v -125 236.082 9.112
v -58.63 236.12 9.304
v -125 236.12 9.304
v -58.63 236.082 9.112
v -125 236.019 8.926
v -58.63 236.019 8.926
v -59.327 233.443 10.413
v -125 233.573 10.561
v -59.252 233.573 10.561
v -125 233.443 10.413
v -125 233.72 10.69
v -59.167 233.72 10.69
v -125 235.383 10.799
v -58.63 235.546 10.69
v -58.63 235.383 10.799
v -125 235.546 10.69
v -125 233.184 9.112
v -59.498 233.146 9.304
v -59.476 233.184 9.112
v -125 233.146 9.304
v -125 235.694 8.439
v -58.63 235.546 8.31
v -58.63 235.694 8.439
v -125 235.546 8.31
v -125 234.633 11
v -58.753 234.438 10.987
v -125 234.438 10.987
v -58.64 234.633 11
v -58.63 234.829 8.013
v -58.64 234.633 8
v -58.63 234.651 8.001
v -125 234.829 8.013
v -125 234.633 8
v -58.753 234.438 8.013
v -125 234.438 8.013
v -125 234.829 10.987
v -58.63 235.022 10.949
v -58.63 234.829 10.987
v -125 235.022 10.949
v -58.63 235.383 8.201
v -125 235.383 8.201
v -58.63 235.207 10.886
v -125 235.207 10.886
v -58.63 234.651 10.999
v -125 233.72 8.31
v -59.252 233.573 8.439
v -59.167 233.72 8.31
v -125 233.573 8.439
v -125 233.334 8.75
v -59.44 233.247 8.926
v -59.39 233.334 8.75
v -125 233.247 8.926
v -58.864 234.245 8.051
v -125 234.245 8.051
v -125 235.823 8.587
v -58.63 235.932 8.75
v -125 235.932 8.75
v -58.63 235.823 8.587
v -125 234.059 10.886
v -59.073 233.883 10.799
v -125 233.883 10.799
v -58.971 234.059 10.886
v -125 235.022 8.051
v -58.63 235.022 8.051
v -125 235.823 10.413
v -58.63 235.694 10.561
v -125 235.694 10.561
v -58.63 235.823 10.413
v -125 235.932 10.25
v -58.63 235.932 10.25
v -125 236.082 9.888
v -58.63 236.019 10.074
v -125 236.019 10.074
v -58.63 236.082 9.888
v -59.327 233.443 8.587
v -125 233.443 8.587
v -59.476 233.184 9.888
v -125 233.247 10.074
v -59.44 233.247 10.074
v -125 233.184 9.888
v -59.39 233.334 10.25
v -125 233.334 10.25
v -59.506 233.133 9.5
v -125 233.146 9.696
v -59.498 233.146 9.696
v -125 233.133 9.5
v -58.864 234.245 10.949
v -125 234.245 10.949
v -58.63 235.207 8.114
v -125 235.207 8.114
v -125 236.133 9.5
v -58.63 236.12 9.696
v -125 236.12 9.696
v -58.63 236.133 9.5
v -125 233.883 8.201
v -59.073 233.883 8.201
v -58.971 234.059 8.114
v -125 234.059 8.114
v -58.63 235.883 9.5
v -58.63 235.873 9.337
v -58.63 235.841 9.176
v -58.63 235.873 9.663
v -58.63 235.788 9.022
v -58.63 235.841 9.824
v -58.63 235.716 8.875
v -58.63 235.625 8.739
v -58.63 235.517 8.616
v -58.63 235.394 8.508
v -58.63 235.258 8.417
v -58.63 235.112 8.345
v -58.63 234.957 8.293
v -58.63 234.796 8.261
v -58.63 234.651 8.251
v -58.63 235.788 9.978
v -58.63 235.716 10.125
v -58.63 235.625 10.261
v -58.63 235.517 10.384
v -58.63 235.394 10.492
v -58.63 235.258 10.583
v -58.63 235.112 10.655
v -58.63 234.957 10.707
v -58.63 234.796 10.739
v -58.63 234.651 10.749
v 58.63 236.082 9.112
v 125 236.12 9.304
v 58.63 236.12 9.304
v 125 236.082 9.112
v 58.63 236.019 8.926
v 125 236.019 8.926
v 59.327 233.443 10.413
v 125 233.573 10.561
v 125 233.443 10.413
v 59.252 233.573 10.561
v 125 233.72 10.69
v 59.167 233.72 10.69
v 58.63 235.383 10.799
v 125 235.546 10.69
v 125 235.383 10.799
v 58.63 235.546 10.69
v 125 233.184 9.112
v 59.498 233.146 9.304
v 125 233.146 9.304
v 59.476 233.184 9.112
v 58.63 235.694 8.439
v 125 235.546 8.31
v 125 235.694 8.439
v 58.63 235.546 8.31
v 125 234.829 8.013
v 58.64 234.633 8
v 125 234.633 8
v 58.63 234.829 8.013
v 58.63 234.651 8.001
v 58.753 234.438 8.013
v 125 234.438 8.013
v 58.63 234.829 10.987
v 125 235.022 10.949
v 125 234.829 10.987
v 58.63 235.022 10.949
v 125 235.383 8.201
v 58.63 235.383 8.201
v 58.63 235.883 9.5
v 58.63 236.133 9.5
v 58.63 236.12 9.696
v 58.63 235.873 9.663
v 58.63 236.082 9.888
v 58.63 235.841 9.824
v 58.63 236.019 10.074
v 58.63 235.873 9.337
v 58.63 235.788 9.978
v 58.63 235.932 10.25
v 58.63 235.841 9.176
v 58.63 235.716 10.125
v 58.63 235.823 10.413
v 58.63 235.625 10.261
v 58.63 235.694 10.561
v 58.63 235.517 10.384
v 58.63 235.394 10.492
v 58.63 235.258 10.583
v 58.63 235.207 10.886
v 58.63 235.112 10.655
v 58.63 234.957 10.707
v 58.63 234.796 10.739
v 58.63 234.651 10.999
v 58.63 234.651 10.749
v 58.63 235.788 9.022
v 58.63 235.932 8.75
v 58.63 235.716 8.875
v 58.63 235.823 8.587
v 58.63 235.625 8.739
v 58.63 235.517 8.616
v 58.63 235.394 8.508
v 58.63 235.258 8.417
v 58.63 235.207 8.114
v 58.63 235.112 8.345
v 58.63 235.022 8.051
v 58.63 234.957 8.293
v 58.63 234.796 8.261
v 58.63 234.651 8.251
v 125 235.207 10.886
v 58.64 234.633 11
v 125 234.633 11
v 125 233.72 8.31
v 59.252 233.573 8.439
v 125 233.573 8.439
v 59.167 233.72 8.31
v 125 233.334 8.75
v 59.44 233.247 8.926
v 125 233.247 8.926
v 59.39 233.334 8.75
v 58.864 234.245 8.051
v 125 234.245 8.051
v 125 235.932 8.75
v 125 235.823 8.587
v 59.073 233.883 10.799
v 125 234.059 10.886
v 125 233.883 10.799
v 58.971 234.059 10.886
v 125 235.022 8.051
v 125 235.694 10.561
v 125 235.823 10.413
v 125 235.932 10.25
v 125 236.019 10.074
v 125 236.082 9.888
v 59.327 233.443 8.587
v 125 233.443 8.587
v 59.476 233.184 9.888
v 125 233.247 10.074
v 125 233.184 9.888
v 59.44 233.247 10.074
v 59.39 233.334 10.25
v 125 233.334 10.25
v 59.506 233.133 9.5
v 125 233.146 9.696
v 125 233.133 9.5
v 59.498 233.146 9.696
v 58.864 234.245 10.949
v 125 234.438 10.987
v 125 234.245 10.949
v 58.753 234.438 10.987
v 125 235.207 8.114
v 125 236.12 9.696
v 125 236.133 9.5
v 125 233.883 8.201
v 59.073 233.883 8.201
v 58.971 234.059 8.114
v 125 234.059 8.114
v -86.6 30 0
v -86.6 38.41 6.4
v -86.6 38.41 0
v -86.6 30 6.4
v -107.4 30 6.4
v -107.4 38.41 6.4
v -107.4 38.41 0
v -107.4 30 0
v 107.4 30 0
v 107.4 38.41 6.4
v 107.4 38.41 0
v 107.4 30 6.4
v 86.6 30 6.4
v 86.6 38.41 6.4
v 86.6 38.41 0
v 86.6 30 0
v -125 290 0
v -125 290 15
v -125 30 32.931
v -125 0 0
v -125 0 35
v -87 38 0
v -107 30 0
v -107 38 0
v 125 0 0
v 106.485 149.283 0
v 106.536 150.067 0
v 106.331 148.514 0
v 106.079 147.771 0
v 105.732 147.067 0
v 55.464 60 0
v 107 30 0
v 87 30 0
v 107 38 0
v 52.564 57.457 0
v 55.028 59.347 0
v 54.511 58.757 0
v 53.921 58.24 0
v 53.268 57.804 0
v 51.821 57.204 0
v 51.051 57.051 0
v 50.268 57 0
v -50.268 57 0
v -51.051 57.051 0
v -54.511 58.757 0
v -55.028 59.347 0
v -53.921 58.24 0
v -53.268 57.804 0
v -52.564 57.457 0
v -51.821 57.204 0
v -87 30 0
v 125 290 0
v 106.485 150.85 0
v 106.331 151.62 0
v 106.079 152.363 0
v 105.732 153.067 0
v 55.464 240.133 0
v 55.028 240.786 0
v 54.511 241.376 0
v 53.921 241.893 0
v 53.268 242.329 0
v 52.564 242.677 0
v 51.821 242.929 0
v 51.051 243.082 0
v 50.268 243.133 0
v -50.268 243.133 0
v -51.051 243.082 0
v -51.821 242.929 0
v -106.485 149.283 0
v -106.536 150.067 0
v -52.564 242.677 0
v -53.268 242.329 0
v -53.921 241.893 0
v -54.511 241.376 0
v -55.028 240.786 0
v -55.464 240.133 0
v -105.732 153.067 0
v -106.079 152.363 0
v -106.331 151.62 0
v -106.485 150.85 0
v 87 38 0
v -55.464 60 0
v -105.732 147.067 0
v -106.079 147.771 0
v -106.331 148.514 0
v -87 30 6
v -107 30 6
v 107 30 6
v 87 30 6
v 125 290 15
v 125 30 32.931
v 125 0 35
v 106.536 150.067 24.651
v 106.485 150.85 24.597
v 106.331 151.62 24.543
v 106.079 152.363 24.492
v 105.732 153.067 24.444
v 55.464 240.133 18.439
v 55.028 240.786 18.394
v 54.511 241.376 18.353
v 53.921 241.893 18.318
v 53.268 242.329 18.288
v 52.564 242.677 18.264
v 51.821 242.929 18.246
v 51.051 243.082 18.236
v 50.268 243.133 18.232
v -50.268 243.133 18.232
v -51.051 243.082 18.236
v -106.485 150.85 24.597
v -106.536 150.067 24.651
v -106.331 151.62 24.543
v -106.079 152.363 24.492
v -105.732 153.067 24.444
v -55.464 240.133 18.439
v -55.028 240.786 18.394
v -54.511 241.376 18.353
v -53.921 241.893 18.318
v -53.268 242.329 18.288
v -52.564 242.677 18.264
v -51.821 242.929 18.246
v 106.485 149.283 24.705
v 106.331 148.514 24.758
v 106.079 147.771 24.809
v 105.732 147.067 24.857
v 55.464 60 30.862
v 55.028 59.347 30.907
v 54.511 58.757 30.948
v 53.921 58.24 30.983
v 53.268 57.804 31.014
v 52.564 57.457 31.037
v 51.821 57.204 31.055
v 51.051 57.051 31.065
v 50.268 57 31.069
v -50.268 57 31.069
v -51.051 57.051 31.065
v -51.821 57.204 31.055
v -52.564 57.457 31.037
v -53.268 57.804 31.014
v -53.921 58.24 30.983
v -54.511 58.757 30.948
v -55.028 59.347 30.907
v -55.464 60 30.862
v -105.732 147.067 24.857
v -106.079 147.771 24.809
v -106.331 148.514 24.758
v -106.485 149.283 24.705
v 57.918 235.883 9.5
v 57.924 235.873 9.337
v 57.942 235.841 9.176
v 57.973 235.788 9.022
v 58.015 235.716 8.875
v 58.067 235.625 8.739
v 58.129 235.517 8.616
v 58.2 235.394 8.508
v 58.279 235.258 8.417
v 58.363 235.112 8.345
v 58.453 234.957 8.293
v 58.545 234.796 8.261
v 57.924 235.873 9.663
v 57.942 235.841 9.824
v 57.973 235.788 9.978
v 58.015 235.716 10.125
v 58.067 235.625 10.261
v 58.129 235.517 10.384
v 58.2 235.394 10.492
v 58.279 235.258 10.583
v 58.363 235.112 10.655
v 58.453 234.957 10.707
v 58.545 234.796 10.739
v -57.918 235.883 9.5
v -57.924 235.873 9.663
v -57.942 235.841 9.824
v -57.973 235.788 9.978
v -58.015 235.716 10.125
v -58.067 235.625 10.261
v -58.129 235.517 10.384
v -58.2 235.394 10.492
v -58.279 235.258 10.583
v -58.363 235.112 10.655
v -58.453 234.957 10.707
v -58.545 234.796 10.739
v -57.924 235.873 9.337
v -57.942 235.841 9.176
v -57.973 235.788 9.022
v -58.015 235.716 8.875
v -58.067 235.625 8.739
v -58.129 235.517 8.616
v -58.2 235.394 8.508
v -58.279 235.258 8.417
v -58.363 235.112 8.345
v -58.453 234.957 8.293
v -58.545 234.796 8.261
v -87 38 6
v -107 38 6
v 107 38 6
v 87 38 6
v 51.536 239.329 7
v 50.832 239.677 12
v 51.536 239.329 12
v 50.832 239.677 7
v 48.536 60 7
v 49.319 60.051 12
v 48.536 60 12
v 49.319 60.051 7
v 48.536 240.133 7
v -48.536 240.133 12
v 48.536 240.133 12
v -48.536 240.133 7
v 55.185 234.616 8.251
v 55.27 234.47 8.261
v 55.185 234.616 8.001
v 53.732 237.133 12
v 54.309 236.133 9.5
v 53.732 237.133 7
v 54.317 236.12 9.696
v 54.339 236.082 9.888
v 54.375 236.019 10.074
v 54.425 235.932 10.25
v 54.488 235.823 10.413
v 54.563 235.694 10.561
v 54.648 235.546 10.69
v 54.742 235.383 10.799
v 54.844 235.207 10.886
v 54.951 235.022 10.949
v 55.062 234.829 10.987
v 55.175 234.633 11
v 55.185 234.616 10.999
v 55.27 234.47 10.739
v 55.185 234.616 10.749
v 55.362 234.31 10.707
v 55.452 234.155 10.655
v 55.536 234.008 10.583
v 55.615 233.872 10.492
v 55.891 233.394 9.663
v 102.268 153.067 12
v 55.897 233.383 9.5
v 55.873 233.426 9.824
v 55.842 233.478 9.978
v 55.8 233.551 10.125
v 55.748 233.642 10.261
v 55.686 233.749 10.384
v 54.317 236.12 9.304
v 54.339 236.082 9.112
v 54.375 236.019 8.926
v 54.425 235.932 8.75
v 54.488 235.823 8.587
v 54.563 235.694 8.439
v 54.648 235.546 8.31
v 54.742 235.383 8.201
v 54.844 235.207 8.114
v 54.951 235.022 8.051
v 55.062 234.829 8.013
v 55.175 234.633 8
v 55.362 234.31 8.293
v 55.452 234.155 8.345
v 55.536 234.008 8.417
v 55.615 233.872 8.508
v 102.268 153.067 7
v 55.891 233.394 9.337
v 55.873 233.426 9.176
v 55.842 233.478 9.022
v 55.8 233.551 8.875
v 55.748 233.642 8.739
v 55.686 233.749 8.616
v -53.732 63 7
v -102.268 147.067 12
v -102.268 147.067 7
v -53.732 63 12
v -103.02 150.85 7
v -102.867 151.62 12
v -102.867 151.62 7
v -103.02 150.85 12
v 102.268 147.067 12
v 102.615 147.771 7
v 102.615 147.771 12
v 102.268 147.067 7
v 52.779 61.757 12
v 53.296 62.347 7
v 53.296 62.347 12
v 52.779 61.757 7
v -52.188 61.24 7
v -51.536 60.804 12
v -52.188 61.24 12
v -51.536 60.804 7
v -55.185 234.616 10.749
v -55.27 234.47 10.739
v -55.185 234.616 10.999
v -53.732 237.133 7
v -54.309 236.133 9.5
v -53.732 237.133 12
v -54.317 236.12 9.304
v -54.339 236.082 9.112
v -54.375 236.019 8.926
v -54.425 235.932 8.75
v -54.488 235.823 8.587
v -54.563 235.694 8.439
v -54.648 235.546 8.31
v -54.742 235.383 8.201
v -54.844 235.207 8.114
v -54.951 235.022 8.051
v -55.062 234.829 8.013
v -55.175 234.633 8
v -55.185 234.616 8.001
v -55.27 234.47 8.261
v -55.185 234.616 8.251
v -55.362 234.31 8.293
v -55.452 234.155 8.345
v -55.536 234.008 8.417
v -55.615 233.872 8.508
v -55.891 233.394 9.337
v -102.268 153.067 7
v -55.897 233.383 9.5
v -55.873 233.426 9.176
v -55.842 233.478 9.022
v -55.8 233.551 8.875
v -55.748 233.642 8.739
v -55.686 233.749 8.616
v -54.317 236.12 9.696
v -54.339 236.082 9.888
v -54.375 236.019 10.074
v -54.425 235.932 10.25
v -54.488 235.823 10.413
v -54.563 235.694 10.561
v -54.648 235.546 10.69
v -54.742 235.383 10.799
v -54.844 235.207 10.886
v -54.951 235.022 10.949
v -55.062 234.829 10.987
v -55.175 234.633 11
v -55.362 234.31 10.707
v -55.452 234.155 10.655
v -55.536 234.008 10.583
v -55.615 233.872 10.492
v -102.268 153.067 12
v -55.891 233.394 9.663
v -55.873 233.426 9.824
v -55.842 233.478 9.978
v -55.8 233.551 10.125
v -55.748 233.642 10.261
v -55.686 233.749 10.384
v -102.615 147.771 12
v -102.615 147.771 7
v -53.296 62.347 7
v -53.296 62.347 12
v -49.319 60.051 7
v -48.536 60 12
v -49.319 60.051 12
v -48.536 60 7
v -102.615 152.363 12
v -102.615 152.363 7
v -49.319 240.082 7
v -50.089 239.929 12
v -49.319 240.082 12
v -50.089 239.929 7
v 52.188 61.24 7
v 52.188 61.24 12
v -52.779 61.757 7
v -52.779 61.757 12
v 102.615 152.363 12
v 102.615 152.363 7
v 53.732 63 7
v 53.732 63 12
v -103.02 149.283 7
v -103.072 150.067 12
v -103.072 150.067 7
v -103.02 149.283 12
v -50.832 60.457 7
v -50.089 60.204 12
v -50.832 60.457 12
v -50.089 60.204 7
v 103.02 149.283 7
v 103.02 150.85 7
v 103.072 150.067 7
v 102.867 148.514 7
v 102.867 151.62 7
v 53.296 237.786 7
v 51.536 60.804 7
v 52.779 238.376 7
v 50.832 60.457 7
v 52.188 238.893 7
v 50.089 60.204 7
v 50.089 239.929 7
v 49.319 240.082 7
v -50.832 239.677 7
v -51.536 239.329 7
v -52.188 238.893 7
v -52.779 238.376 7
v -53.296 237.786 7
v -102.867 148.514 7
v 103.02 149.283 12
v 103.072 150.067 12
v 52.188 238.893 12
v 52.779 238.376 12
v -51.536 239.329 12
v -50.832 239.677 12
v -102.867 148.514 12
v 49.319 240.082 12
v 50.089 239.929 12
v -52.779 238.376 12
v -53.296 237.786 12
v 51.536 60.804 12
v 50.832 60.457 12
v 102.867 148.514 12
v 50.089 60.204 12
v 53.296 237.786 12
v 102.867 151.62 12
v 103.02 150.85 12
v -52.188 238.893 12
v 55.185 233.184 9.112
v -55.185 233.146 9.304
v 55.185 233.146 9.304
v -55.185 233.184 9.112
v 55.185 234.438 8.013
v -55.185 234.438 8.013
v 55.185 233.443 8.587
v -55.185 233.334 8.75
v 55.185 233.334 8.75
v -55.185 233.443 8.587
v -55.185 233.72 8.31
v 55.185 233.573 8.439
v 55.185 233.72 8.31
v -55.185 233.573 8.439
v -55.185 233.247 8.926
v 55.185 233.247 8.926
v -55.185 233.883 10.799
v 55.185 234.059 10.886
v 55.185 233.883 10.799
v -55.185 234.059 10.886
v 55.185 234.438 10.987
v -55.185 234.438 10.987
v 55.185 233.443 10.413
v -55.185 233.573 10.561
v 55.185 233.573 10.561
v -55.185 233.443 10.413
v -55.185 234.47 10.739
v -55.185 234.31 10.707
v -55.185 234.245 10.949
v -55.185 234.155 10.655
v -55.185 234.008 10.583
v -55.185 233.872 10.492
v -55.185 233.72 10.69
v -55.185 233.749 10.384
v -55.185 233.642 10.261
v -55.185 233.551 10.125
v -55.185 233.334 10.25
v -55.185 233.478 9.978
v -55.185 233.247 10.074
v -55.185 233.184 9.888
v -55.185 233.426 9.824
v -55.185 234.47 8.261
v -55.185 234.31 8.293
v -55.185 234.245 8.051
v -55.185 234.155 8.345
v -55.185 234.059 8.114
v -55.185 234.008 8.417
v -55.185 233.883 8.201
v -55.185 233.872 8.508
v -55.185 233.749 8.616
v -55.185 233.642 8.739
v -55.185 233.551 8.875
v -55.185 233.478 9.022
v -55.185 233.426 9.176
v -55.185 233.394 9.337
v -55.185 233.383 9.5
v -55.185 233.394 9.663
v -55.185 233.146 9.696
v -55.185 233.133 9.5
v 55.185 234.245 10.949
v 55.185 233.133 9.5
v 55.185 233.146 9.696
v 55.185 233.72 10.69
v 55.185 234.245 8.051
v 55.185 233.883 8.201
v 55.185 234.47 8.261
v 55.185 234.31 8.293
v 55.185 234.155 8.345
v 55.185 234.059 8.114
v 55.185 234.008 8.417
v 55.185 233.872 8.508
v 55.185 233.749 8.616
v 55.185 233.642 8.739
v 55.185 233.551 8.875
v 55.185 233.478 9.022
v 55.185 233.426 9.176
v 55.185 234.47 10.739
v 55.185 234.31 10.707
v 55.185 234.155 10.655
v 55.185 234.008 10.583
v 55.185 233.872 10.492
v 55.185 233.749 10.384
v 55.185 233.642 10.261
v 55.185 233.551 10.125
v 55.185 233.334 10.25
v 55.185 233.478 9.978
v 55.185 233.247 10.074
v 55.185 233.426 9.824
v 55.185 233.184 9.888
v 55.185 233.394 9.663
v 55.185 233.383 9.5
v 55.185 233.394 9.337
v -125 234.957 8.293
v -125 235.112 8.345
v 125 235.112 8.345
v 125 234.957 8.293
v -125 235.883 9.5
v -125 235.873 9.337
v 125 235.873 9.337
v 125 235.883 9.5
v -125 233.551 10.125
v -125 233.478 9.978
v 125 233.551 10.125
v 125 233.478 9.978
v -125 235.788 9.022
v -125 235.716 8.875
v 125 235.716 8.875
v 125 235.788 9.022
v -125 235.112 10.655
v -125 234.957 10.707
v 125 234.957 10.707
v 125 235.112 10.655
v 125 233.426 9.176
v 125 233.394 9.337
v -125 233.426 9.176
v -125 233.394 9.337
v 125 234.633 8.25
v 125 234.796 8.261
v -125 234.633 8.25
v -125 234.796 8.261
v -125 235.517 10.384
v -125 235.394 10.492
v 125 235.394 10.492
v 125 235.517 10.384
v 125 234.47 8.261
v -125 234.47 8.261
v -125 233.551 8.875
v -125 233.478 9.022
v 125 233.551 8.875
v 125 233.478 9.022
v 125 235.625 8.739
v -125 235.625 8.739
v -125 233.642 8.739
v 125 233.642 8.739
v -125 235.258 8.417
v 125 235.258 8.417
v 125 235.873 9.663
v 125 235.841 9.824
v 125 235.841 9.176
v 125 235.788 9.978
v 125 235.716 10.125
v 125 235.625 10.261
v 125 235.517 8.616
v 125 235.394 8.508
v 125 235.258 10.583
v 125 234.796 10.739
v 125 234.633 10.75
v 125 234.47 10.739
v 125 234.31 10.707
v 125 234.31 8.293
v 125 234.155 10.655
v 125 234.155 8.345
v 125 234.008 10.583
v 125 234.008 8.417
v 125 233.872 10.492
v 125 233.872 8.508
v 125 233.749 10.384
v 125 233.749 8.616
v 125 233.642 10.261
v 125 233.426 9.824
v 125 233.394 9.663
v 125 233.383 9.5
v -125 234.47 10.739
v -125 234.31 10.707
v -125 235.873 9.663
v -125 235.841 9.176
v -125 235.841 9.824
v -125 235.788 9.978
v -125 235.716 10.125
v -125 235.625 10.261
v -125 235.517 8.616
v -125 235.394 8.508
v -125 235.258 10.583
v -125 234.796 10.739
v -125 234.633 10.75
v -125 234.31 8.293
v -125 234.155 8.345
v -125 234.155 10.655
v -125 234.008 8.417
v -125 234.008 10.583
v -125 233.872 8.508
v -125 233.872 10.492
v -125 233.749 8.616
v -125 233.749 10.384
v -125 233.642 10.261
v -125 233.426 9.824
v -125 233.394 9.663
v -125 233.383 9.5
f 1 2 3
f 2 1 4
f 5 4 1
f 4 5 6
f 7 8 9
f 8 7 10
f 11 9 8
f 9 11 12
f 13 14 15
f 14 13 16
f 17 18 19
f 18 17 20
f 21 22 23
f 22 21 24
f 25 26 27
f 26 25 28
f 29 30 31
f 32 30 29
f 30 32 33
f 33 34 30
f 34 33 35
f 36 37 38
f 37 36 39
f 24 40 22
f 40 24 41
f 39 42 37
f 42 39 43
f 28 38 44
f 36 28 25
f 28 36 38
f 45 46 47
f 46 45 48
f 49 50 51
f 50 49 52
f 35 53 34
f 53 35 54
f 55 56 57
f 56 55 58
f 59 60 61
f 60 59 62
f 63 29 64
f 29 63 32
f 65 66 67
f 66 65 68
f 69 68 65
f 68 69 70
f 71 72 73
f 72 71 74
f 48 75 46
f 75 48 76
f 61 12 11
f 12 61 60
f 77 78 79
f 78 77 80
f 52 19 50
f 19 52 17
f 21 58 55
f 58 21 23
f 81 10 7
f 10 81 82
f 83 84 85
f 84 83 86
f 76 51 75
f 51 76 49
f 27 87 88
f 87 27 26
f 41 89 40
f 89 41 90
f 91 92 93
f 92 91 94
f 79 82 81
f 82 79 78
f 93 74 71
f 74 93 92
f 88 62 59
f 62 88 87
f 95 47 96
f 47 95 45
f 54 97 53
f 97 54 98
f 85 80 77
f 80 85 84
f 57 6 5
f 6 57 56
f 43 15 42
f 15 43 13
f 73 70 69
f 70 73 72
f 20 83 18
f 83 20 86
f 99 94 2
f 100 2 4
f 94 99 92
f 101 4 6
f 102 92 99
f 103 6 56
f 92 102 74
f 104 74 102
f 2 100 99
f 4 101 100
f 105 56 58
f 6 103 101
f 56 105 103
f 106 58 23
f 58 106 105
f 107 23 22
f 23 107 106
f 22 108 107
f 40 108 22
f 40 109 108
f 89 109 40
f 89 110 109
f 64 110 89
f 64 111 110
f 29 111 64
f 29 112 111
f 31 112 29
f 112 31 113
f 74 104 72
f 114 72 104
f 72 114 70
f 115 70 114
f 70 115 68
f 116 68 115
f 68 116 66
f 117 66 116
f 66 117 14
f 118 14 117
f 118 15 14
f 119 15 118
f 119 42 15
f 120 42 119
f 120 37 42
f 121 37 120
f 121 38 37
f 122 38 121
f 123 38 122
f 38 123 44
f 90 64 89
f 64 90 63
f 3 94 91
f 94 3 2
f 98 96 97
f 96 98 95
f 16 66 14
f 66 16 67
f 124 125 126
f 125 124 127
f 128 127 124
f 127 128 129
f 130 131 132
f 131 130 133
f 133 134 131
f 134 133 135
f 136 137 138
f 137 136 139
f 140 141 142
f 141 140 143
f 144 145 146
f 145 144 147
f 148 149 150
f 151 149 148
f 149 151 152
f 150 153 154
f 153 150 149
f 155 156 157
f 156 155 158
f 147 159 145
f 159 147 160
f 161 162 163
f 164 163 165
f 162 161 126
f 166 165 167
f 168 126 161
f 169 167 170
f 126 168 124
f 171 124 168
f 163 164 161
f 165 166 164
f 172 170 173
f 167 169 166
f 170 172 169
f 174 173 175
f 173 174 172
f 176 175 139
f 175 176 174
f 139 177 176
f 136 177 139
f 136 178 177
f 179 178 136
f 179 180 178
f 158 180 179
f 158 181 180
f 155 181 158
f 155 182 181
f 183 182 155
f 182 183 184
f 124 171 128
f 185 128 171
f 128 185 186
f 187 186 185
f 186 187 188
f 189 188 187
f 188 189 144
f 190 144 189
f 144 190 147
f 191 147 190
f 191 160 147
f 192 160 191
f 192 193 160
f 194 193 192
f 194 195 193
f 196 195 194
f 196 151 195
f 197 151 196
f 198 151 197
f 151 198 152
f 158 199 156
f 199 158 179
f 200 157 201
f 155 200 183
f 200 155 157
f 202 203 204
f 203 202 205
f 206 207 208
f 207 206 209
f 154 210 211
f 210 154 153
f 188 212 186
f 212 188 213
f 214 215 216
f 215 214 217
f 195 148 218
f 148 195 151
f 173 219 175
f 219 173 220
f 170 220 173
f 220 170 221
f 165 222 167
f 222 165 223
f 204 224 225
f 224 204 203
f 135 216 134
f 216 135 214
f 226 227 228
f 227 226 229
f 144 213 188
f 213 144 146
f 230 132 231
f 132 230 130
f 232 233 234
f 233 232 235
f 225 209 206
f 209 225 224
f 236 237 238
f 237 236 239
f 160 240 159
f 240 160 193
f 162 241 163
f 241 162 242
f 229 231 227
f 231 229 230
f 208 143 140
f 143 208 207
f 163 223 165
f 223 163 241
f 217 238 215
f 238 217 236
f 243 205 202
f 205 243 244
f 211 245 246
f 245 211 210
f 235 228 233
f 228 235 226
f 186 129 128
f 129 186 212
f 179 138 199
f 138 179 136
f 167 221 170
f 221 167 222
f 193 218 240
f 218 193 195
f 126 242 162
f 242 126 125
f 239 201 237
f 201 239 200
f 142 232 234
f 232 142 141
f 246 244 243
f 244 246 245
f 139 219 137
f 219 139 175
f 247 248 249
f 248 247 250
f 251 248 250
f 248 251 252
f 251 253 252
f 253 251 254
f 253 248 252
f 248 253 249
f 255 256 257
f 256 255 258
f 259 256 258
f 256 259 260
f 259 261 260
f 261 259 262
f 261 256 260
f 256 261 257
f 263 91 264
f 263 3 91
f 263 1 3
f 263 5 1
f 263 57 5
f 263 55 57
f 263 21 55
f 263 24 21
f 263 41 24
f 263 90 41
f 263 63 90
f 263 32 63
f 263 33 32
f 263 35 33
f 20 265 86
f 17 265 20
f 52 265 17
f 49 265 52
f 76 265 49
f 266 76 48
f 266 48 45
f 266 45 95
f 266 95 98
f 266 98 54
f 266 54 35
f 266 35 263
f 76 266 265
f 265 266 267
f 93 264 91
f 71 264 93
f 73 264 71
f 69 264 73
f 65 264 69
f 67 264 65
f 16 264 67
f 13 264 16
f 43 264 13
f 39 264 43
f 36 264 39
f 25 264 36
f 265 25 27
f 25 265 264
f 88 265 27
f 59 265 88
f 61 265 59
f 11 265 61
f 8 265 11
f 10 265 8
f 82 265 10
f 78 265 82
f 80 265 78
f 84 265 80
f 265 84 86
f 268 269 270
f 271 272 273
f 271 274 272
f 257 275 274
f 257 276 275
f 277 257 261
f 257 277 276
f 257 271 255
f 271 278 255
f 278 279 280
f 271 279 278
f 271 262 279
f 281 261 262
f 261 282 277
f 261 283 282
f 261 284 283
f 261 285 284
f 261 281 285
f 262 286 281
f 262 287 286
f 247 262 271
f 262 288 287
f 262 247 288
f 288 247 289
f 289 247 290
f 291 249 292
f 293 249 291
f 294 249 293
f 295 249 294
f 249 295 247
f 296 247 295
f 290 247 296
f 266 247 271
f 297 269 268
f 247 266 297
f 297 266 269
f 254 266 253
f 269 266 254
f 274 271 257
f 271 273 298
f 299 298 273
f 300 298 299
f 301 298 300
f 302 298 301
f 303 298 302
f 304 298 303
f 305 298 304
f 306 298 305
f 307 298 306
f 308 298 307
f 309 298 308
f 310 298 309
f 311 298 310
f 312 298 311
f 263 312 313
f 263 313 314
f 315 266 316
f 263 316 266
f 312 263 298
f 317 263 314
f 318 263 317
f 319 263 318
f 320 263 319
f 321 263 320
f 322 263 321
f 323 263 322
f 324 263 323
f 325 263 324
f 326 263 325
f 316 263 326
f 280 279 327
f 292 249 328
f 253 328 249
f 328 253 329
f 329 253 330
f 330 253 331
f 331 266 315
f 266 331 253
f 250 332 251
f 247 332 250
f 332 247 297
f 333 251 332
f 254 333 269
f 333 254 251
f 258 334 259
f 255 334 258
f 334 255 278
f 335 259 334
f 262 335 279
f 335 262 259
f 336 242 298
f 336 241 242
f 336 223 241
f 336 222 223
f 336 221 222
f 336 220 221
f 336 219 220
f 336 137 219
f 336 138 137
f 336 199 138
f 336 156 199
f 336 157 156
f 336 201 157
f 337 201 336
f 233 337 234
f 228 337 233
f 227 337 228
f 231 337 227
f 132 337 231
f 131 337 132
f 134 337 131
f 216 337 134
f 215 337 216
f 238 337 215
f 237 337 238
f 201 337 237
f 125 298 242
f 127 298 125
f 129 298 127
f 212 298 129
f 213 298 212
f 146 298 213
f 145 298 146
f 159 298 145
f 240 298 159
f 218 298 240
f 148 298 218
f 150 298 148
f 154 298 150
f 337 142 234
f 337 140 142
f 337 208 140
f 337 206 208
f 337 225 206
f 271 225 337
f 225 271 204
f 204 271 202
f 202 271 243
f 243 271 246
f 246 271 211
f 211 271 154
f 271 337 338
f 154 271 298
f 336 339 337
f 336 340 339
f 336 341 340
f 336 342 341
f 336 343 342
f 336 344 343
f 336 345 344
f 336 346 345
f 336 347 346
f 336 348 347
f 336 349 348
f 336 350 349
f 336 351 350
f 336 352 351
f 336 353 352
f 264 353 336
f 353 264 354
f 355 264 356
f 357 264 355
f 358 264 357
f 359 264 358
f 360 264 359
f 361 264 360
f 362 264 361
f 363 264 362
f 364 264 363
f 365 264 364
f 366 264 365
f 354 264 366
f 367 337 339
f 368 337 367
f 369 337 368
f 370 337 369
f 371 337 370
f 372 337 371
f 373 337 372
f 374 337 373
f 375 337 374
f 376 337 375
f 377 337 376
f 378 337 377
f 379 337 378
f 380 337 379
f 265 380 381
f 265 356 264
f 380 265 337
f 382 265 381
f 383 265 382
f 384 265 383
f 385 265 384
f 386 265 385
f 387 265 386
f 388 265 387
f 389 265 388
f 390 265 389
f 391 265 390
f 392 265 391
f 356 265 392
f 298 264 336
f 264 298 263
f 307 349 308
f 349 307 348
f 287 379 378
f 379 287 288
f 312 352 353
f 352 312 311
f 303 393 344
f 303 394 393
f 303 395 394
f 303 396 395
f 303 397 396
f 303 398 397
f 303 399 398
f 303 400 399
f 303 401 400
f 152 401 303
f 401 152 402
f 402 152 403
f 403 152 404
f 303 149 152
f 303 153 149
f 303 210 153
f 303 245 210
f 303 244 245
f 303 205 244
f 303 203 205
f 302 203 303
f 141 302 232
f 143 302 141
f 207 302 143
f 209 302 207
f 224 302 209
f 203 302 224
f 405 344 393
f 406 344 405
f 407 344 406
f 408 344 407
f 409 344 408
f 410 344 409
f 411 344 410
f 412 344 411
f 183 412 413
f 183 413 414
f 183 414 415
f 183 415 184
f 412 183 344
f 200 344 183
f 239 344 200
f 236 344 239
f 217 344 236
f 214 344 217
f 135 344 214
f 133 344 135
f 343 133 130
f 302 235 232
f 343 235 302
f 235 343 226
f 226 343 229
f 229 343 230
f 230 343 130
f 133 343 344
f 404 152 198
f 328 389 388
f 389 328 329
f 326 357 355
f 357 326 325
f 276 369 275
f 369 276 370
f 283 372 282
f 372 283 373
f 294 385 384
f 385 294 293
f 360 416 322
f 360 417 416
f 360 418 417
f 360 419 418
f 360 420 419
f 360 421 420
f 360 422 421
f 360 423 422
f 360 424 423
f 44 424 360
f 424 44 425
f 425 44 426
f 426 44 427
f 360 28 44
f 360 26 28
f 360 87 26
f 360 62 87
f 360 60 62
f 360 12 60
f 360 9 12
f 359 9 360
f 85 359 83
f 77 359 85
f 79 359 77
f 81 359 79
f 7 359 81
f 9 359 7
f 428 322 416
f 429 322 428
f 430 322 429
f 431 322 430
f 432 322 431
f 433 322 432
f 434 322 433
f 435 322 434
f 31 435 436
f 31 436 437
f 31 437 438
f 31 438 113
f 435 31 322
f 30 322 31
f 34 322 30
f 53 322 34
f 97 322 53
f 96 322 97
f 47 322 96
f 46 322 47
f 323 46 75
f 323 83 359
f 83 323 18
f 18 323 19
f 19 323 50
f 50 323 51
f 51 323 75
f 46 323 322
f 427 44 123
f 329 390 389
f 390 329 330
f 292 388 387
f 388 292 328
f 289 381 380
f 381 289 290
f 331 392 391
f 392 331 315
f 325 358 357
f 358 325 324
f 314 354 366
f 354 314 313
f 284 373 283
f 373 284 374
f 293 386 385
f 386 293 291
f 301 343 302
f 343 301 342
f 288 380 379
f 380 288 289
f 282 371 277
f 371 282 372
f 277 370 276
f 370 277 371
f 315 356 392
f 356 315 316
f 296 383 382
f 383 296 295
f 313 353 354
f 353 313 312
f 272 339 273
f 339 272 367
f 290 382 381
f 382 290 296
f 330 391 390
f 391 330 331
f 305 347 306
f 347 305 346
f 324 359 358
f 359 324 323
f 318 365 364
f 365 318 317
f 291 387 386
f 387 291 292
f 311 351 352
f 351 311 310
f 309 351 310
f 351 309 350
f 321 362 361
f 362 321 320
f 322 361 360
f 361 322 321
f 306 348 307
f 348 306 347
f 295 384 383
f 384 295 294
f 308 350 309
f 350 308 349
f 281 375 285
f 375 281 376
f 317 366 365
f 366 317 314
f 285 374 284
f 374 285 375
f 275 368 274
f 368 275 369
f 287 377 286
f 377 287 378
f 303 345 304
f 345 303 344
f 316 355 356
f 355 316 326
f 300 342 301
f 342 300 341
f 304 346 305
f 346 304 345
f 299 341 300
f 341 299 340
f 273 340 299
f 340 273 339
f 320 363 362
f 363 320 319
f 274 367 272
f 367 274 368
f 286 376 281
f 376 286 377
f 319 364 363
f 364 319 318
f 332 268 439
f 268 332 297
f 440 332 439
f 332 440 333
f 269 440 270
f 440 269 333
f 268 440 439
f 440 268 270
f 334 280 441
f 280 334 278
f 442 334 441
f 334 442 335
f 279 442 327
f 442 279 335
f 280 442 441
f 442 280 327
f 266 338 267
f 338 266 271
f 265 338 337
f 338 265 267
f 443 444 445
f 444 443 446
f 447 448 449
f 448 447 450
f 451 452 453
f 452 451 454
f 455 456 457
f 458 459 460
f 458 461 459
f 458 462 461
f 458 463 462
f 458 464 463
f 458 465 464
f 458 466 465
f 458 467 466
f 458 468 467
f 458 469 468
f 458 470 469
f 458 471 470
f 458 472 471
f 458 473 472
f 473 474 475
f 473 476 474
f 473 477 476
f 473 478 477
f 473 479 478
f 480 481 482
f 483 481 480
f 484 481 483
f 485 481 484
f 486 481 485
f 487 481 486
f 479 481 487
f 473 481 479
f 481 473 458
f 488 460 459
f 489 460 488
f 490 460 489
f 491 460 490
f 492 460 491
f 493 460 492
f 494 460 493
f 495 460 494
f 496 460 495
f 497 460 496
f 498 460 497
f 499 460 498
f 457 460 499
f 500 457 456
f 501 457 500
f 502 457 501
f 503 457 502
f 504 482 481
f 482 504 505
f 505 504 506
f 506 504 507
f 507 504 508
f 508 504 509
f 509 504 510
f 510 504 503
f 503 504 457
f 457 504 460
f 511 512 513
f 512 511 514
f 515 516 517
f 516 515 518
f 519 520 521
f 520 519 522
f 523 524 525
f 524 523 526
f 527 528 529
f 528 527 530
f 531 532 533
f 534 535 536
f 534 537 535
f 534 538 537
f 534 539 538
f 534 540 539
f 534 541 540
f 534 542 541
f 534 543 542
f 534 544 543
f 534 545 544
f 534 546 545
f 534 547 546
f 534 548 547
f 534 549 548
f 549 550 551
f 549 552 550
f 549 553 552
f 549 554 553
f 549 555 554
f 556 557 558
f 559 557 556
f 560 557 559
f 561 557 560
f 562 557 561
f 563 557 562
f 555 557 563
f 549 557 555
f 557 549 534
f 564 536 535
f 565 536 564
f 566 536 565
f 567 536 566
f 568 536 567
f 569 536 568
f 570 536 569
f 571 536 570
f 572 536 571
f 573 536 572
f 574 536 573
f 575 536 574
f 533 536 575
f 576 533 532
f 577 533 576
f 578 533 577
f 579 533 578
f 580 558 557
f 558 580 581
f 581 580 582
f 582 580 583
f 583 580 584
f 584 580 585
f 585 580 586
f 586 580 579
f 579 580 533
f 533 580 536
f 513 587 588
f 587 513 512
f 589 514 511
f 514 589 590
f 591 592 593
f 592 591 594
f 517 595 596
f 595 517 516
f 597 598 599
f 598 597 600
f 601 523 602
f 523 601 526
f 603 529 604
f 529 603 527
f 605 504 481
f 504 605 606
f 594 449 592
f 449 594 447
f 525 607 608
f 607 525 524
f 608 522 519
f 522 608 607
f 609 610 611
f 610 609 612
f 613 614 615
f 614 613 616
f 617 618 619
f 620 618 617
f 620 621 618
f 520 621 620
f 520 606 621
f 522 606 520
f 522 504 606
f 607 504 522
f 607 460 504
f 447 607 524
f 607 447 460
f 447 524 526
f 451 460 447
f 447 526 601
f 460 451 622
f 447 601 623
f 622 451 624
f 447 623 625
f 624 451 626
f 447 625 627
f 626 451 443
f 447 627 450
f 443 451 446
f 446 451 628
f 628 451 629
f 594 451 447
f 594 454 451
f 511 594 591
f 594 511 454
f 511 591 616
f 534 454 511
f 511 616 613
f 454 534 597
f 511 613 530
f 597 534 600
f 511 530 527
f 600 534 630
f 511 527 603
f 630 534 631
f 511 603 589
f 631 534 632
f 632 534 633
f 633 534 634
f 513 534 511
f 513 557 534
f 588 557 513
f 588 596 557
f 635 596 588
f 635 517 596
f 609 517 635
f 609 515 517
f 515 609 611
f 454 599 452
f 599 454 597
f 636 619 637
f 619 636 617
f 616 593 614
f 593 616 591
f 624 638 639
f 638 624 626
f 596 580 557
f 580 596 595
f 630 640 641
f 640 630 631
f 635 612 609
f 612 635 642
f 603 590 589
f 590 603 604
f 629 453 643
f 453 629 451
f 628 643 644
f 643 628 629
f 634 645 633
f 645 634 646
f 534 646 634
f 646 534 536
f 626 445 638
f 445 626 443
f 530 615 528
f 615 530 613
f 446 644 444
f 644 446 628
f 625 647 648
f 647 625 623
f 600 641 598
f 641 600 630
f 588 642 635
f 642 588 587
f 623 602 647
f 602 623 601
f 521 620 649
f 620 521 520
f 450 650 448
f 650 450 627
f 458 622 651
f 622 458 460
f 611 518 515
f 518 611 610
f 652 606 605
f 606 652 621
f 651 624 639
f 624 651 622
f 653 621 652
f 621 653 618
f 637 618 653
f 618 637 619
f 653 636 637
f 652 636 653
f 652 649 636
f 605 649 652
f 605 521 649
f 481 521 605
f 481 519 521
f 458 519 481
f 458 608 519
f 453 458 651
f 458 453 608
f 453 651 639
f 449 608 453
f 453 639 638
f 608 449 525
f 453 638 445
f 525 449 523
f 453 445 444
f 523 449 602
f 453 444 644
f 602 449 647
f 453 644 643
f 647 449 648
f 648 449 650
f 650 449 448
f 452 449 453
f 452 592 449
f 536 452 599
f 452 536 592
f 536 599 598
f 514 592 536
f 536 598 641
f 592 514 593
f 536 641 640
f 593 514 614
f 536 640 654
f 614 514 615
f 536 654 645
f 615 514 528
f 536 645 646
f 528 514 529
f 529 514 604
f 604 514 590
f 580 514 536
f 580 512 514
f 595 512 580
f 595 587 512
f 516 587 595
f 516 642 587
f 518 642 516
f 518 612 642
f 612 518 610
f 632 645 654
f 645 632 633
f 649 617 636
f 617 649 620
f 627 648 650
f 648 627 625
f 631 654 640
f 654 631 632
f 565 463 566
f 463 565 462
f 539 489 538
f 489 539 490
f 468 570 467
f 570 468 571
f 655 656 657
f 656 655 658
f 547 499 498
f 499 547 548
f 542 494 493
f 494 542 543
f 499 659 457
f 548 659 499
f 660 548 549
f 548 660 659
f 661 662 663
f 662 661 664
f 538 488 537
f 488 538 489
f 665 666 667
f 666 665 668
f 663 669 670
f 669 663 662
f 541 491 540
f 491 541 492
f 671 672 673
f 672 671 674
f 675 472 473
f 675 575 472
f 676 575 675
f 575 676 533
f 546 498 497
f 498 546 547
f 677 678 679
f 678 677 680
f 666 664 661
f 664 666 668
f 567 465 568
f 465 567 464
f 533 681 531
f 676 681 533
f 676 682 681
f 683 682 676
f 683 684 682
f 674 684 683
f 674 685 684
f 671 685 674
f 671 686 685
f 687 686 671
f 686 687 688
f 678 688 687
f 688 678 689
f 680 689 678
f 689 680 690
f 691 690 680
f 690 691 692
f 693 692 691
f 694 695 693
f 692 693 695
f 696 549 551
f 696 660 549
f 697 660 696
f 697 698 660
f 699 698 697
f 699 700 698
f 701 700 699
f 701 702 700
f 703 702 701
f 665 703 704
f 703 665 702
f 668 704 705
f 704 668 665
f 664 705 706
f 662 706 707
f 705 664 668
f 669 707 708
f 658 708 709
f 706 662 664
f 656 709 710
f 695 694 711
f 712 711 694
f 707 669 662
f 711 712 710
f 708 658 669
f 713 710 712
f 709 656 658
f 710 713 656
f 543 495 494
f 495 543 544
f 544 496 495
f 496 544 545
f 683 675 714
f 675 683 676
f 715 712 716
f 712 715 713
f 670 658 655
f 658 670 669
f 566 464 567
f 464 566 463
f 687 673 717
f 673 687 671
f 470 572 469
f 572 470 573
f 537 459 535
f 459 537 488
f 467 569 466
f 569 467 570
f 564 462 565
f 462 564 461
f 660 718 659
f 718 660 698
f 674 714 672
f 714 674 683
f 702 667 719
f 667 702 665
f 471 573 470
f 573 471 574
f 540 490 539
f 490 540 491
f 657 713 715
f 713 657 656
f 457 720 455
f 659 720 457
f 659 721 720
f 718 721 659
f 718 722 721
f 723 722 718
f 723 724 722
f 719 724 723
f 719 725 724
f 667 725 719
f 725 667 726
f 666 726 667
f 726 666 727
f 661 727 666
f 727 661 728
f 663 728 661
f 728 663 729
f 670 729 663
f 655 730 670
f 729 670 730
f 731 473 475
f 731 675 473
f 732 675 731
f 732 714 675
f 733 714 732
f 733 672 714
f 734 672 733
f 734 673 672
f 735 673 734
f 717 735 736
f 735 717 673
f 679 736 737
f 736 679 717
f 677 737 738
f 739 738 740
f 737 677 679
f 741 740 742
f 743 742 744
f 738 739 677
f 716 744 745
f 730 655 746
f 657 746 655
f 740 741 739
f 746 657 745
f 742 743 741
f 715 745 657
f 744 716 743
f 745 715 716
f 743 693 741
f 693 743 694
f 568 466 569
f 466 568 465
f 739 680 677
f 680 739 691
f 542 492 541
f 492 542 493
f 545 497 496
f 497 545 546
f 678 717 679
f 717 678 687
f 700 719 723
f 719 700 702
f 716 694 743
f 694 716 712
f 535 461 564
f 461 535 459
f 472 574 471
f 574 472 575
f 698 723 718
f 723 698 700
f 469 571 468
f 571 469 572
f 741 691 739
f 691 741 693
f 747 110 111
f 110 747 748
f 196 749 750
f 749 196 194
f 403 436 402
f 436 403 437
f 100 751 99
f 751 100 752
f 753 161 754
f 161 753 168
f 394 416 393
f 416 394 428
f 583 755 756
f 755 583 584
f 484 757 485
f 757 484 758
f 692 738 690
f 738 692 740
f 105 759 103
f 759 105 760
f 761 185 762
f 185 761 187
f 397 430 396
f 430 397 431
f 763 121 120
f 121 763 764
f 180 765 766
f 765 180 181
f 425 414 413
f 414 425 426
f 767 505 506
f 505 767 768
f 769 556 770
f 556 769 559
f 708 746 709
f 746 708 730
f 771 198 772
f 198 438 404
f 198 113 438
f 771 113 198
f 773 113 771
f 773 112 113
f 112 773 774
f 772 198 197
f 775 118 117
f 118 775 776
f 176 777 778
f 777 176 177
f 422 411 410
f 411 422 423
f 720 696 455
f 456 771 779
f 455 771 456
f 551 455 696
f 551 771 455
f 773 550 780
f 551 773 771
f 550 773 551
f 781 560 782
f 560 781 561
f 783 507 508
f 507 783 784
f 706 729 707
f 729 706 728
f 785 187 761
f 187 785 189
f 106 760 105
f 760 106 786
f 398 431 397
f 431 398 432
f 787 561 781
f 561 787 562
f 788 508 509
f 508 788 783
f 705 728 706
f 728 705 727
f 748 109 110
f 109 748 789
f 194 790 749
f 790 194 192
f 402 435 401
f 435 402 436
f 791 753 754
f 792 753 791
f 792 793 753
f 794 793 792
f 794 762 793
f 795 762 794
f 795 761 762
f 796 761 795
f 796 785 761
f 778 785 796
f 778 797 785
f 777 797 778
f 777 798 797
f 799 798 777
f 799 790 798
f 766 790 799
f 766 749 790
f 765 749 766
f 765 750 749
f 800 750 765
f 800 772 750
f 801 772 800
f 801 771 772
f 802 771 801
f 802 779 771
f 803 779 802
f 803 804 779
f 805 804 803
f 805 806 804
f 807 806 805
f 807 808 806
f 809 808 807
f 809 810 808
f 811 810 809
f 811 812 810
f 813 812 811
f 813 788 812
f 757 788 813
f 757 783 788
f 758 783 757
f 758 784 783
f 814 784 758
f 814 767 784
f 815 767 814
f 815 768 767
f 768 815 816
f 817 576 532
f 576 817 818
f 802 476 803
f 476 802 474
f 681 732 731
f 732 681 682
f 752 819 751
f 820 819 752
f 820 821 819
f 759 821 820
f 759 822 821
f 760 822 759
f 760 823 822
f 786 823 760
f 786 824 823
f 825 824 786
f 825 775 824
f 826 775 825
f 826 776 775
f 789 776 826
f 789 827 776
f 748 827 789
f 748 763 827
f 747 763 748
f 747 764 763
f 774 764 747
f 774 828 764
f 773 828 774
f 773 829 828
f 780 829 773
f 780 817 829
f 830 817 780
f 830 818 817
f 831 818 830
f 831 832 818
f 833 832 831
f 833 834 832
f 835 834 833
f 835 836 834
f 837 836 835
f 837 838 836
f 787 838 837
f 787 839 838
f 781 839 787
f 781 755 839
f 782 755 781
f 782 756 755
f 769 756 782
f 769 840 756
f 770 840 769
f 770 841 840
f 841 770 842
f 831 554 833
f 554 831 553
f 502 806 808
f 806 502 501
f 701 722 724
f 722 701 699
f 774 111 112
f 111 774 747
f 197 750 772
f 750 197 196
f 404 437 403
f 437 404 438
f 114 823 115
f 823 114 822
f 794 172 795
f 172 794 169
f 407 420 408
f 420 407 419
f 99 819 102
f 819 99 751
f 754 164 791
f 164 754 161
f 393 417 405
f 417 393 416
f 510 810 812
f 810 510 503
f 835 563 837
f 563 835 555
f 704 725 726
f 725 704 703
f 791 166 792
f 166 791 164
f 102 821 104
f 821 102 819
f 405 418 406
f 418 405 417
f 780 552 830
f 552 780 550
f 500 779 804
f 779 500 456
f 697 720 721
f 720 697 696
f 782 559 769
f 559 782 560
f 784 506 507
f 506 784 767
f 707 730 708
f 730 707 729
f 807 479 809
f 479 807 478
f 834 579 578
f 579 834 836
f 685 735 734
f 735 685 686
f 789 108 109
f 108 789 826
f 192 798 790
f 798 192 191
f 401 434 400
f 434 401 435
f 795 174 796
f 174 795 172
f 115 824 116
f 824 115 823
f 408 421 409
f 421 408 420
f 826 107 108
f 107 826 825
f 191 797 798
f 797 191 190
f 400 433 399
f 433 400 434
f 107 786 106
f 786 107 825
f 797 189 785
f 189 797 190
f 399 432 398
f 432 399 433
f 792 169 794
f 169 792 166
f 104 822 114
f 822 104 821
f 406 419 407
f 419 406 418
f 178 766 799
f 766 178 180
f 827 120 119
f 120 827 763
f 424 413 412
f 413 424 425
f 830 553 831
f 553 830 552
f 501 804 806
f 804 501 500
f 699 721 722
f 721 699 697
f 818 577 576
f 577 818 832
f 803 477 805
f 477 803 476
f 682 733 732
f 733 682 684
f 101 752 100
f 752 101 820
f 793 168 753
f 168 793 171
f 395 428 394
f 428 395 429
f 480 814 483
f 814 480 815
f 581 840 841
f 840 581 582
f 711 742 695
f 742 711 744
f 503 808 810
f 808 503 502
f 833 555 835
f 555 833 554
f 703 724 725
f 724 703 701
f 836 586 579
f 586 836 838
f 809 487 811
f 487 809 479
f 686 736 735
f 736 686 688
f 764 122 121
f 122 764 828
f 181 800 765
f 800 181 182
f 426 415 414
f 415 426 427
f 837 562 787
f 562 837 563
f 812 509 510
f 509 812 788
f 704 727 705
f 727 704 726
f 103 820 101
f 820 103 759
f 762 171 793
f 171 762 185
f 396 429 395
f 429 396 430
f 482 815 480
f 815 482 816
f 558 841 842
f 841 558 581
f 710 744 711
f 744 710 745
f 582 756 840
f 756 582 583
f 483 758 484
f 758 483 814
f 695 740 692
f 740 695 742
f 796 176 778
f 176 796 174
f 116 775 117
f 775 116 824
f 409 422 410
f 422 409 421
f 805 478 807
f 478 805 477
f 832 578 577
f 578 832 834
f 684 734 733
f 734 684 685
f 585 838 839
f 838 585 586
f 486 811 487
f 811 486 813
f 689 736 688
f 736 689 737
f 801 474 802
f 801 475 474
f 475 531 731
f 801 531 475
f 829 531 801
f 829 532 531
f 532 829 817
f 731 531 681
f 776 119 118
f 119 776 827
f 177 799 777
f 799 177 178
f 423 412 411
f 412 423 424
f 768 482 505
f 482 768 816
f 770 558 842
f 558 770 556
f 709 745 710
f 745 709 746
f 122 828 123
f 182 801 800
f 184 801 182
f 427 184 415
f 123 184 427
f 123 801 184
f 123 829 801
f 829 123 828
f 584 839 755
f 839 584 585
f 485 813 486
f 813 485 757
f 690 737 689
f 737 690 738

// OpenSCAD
// Parametric cat door in millimeters.
// Includes a split rectangular frame, a rounded hexagonal door, optional hex screen,
// aligned 3 mm hinge-axis holes, and a separate 250 mm x 2.5 mm rod.

$fn = 48;
eps = 0.01;

// Overall frame dimensions.
frame_width_mm = 250;
frame_total_height_mm = 290;
frame_top_section_height_mm = 260;
frame_bottom_extension_height_mm = 30;

// Frame depth profile.
frame_top_depth_mm = 15;
frame_bottom_depth_mm = 35;

// Door and opening controls.
door_thickness_mm = 5;
frame_side_margin_mm = 18;
frame_top_margin_mm = 18;
bottom_swing_clearance_mm = 40;
door_vertical_offset_mm = 20;
clearance_mm = 3;
door_edge_frame_mm = 10;
hex_corner_radius_mm = 6;

// Screen pattern controls.
disable_hex_grid = true;
screen_hole_mm = 2;
screen_web_mm = 0.5;

// Hinge-axis hole controls.
alignment_hole_diameter_mm = 3;
alignment_hole_top_margin_mm = 4;
alignment_hole_z_offset_mm = 7;

// Separate rod.
hinge_rod_length_mm = 250;
hinge_rod_diameter_mm = 2.5;

// Split-joint controls for the 30 mm bottom extension.
joint_tongue_width_mm = 20;
joint_tongue_height_mm = 8;
joint_tongue_depth_mm = 6;
joint_tongue_clearance_mm = 0.4;
joint_side_inset_mm = 18;

// Display controls.
render_object = "assembled"; // "assembled", "top-and-door", "bottom", "rod"
layout_gap_mm = 20;
show_hinge_rod = true;

split_y_mm = frame_bottom_extension_height_mm;
max_frame_depth_mm = max(frame_top_depth_mm, frame_bottom_depth_mm);
sqrt3 = sqrt(3);

function frame_depth_at_y(y_pos) =
    frame_bottom_depth_mm
    - ((frame_bottom_depth_mm - frame_top_depth_mm) * (y_pos / frame_total_height_mm));

available_door_width_mm = frame_width_mm - (2 * frame_side_margin_mm) - (2 * clearance_mm);
available_door_height_mm = frame_total_height_mm - bottom_swing_clearance_mm - frame_top_margin_mm - clearance_mm;

// Flat-top regular hexagon: width = 2r, height = sqrt(3) * r.
door_radius_mm = min(
    available_door_width_mm / 2,
    available_door_height_mm / sqrt3
);

door_half_height_mm = (sqrt3 / 2) * door_radius_mm;
door_center_y_mm = bottom_swing_clearance_mm + door_half_height_mm + door_vertical_offset_mm;
door_top_local_y_mm = door_half_height_mm;

frame_opening_radius_mm = door_radius_mm + ((2 * clearance_mm) / sqrt3);
frame_opening_half_height_mm = (sqrt3 / 2) * frame_opening_radius_mm;
frame_opening_bottom_y_mm = door_center_y_mm - frame_opening_half_height_mm;
frame_opening_top_y_mm = door_center_y_mm + frame_opening_half_height_mm;

alignment_hole_radius_mm = alignment_hole_diameter_mm / 2;
alignment_hole_local_y_mm = door_top_local_y_mm - alignment_hole_radius_mm - alignment_hole_top_margin_mm;
alignment_hole_global_y_mm = door_center_y_mm + alignment_hole_local_y_mm;
alignment_hole_local_z_mm = door_thickness_mm / 2;
alignment_hole_global_z_mm = alignment_hole_local_z_mm + alignment_hole_z_offset_mm;

door_hole_half_width_mm = door_radius_mm - (abs(alignment_hole_local_y_mm) / sqrt3);
frame_opening_half_width_mm = frame_opening_radius_mm - (abs(alignment_hole_local_y_mm) / sqrt3);
frame_side_hole_length_mm = (frame_width_mm / 2) - frame_opening_half_width_mm;
frame_side_hole_center_x_mm = (frame_opening_half_width_mm + (frame_width_mm / 2)) / 2;

joint_center_x_mm = (frame_width_mm / 2) - joint_side_inset_mm - (joint_tongue_width_mm / 2);
joint_groove_depth_mm = joint_tongue_depth_mm + joint_tongue_clearance_mm;
joint_groove_width_mm = joint_tongue_width_mm + (2 * joint_tongue_clearance_mm);
joint_groove_height_mm = joint_tongue_height_mm + joint_tongue_clearance_mm;

assert(
    frame_top_section_height_mm + frame_bottom_extension_height_mm == frame_total_height_mm,
    "Top section height plus bottom extension height must equal total frame height."
);
assert(frame_width_mm > 0, "frame_width_mm must be positive.");
assert(frame_total_height_mm > 0, "frame_total_height_mm must be positive.");
assert(frame_top_depth_mm > 0, "frame_top_depth_mm must be positive.");
assert(frame_bottom_depth_mm > 0, "frame_bottom_depth_mm must be positive.");
assert(door_thickness_mm > 0, "door_thickness_mm must be positive.");
assert(door_thickness_mm <= frame_top_depth_mm, "door_thickness_mm must fit within the top frame thickness.");
assert(clearance_mm >= 0, "clearance_mm must be zero or positive.");
assert(bottom_swing_clearance_mm > 0, "bottom_swing_clearance_mm must be positive.");
assert(door_vertical_offset_mm >= 0, "door_vertical_offset_mm must be zero or positive.");
assert(door_radius_mm > 0, "The current dimensions leave no room for the door.");
assert(hex_corner_radius_mm >= 0, "hex_corner_radius_mm must be zero or positive.");
assert(
    hex_corner_radius_mm < ((sqrt3 / 2) * door_radius_mm),
    "hex_corner_radius_mm is too large for the hexagon size."
);
assert(
    door_edge_frame_mm < ((sqrt3 / 2) * door_radius_mm),
    "door_edge_frame_mm is too large for the hexagonal door."
);
assert(frame_opening_bottom_y_mm >= split_y_mm, "The frame opening extends into the bottom extension section.");
assert(frame_opening_top_y_mm <= frame_total_height_mm, "The frame opening extends above the frame.");
assert(screen_hole_mm > 0, "screen_hole_mm must be positive.");
assert(screen_web_mm >= 0, "screen_web_mm must be zero or positive.");
assert(alignment_hole_diameter_mm > 0, "alignment_hole_diameter_mm must be positive.");
assert(
    alignment_hole_diameter_mm <= door_thickness_mm,
    "alignment_hole_diameter_mm must fit within the door thickness."
);
assert(
    alignment_hole_global_z_mm - alignment_hole_radius_mm >= 0,
    "alignment_hole_z_offset_mm places the hole below the frame front face."
);
assert(
    alignment_hole_global_z_mm + alignment_hole_radius_mm <= frame_depth_at_y(alignment_hole_global_y_mm),
    "alignment_hole_z_offset_mm places the hole outside the frame thickness at the hinge-axis height."
);
assert(
    alignment_hole_local_y_mm + alignment_hole_radius_mm <= door_top_local_y_mm,
    "alignment hole is above the top side of the hex door."
);
assert(door_hole_half_width_mm > 0, "alignment hole is too high for the hex door.");
assert(frame_side_hole_length_mm > 0, "alignment hole does not intersect the frame sides.");
assert(joint_tongue_width_mm > 0, "joint_tongue_width_mm must be positive.");
assert(joint_tongue_height_mm > 0, "joint_tongue_height_mm must be positive.");
assert(joint_tongue_depth_mm > 0, "joint_tongue_depth_mm must be positive.");
assert(joint_tongue_clearance_mm >= 0, "joint_tongue_clearance_mm must be zero or positive.");
assert(joint_center_x_mm - (joint_tongue_width_mm / 2) > 0, "Joint tongues extend beyond the frame width.");

module hexagon_2d(radius) {
    polygon(points = [
        [ radius, 0],
        [ radius / 2,  (sqrt3 / 2) * radius],
        [-radius / 2,  (sqrt3 / 2) * radius],
        [-radius, 0],
        [-radius / 2, -(sqrt3 / 2) * radius],
        [ radius / 2, -(sqrt3 / 2) * radius]
    ]);
}

module rounded_hexagon_2d(radius, corner_radius_mm) {
    if (corner_radius_mm > 0)
        offset(r = corner_radius_mm)
            offset(delta = -corner_radius_mm)
                hexagon_2d(radius);
    else
        hexagon_2d(radius);
}

module honeycomb_holes_2d(bounds_radius, hole_flat_mm, web_mm) {
    hole_radius_mm = hole_flat_mm / sqrt3;
    cell_radius_mm = (hole_flat_mm + web_mm) / sqrt3;
    q_limit = ceil((bounds_radius * 2) / (1.5 * cell_radius_mm)) + 2;
    r_limit = ceil((bounds_radius * 2) / (sqrt3 * cell_radius_mm)) + 2;

    union() {
        for (q = [-q_limit : q_limit]) {
            for (r = [-r_limit : r_limit]) {
                translate([
                    1.5 * cell_radius_mm * q,
                    sqrt3 * cell_radius_mm * (r + (q / 2))
                ])
                    hexagon_2d(hole_radius_mm);
            }
        }
    }
}

module x_cylinder(length_mm, diameter_mm) {
    rotate([0, 90, 0])
        cylinder(h = length_mm, d = diameter_mm, center = true);
}

module frame_section_body(y_min_mm, y_max_mm) {
    depth_min_mm = frame_depth_at_y(y_min_mm);
    depth_max_mm = frame_depth_at_y(y_max_mm);

    rotate([0, 90, 0])
        linear_extrude(height = frame_width_mm, center = true, convexity = 10)
            polygon(points = [
                [0, y_min_mm],
                [0, y_max_mm],
                [-depth_max_mm, y_max_mm],
                [-depth_min_mm, y_min_mm]
            ]);
}

module door_panel_2d() {
    rounded_hexagon_2d(door_radius_mm, hex_corner_radius_mm);
}

module frame_opening_2d() {
    rounded_hexagon_2d(frame_opening_radius_mm, hex_corner_radius_mm);
}

module door_screen_region_2d() {
    offset(delta = -door_edge_frame_mm)
        door_panel_2d();
}

module door_alignment_hole_cut() {
    translate([0, alignment_hole_local_y_mm, alignment_hole_local_z_mm])
        x_cylinder((2 * door_hole_half_width_mm) + (2 * eps), alignment_hole_diameter_mm);
}

module frame_alignment_hole_cut() {
    union() {
        translate([-frame_side_hole_center_x_mm, alignment_hole_global_y_mm, alignment_hole_global_z_mm])
            x_cylinder(frame_side_hole_length_mm + (2 * eps), alignment_hole_diameter_mm);

        translate([ frame_side_hole_center_x_mm, alignment_hole_global_y_mm, alignment_hole_global_z_mm])
            x_cylinder(frame_side_hole_length_mm + (2 * eps), alignment_hole_diameter_mm);
    }
}

module bottom_extension_tongues() {
    union() {
        translate([
            -joint_center_x_mm - (joint_tongue_width_mm / 2),
            split_y_mm - eps,
            0
        ])
            cube([joint_tongue_width_mm, joint_tongue_height_mm + eps, joint_tongue_depth_mm]);

        translate([
             joint_center_x_mm - (joint_tongue_width_mm / 2),
            split_y_mm - eps,
            0
        ])
            cube([joint_tongue_width_mm, joint_tongue_height_mm + eps, joint_tongue_depth_mm]);
    }
}

module top_section_grooves() {
    union() {
        translate([
            -joint_center_x_mm - (joint_groove_width_mm / 2),
            split_y_mm - eps,
            -eps
        ])
            cube([joint_groove_width_mm, joint_groove_height_mm + (2 * eps), joint_groove_depth_mm + eps]);

        translate([
             joint_center_x_mm - (joint_groove_width_mm / 2),
            split_y_mm - eps,
            -eps
        ])
            cube([joint_groove_width_mm, joint_groove_height_mm + (2 * eps), joint_groove_depth_mm + eps]);
    }
}

module top_frame_part() {
    color([0.18, 0.65, 0.22])
        difference() {
            frame_section_body(split_y_mm, frame_total_height_mm);

            translate([0, door_center_y_mm, -eps])
                linear_extrude(height = max_frame_depth_mm + (2 * eps), convexity = 10)
                    frame_opening_2d();

            frame_alignment_hole_cut();
            top_section_grooves();
        }
}

module bottom_extension_part() {
    color([0.82, 0.18, 0.18])
        union() {
            frame_section_body(0, split_y_mm);
            bottom_extension_tongues();
        }
}

module door_part() {
    color([0.78, 0.80, 0.84])
        translate([0, door_center_y_mm, alignment_hole_z_offset_mm])
            difference() {
                linear_extrude(height = door_thickness_mm, convexity = 10)
                    door_panel_2d();

                if (!disable_hex_grid)
                    translate([0, 0, -eps])
                        linear_extrude(height = door_thickness_mm + (2 * eps), convexity = 10)
                            intersection() {
                                door_screen_region_2d();
                                honeycomb_holes_2d(
                                    bounds_radius = door_radius_mm,
                                    hole_flat_mm = screen_hole_mm,
                                    web_mm = screen_web_mm
                                );
                            }

                door_alignment_hole_cut();
            }
}

module hinge_rod_part() {
    color([0.70, 0.12, 0.12])
        x_cylinder(hinge_rod_length_mm, hinge_rod_diameter_mm);
}

module assembled_view() {
    top_frame_part();
    bottom_extension_part();
    door_part();

    if (show_hinge_rod)
        translate([0, alignment_hole_global_y_mm, alignment_hole_global_z_mm])
            hinge_rod_part();
}

module top_and_door_printable() {
    translate([0, 0, 0])
        top_frame_part();

    translate([0, -(door_center_y_mm - door_half_height_mm + layout_gap_mm), 0])
        door_part();
}

module bottom_printable() {
    bottom_extension_part();
}

module rod_printable() {
    translate([0, 0, hinge_rod_diameter_mm / 2])
        hinge_rod_part();
}

if (render_object == "assembled")
    assembled_view();
else if (render_object == "top-and-door")
    top_and_door_printable();
else if (render_object == "bottom")
    bottom_printable();
else if (render_object == "rod")
    rod_printable();
else
    assert(false, "render_object must be one of: assembled, top-and-door, bottom, rod");
